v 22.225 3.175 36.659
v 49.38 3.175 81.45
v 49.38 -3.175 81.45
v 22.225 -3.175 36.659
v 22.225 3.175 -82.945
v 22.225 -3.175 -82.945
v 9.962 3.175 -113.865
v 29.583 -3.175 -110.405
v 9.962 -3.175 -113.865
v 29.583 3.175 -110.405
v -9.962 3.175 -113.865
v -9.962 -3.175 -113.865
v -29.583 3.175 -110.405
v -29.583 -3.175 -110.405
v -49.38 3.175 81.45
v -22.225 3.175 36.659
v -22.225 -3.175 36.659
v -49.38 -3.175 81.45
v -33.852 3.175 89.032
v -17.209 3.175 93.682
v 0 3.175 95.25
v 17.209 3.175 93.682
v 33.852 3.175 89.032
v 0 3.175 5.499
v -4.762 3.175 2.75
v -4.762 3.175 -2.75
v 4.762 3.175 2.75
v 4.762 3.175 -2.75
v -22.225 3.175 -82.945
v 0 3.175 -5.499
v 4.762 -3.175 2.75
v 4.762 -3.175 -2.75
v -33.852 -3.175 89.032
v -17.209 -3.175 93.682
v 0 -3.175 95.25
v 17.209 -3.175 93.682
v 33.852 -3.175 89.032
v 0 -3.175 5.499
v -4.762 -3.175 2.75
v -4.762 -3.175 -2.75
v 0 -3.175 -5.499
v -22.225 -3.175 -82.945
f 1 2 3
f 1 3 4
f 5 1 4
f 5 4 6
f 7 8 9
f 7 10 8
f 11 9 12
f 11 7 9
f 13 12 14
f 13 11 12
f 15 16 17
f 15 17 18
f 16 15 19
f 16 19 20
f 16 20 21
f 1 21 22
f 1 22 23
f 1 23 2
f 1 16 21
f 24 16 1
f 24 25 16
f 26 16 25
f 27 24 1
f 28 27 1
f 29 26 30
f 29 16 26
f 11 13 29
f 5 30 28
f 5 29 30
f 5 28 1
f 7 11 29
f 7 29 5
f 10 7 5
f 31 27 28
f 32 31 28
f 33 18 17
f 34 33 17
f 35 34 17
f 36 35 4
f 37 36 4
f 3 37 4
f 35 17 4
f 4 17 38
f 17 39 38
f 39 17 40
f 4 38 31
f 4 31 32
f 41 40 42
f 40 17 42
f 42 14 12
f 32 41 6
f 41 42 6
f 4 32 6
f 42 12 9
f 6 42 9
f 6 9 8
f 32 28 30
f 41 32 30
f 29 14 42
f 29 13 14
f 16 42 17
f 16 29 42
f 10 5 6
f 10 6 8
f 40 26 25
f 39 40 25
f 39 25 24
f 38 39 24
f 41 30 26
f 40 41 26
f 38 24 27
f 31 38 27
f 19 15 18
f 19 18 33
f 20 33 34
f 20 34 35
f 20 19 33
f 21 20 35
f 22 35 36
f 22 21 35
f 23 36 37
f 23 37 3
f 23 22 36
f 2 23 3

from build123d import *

# Parameters (mm, degrees)
BOSS_EXTRUDE1_DEPTH = 3.175
CUT_EXTRUDE1_REACH  = 126.672


with BuildPart() as part:
    # Sketch1 → Boss-Extrude1 (new, symmetric)
    with BuildSketch(Plane(origin=(0, 0, 0), x_dir=(1, 0, 0), z_dir=(0, 1, 0))):
        with BuildLine():
            Line((-22.225, 82.944829198), (-22.225, -36.659057496))
            Line((-22.225, -36.659057496), (-49.38024545, -81.450315281))
            ThreePointArc((-49.38024545, -81.450315281), (0, -95.25), (49.38024545, -81.450315281))
            Line((49.38024545, -81.450315281), (22.225, -36.659057496))
            Line((22.225, -36.659057496), (22.225, 82.944829198))
            Line((22.225, 82.944829198), (29.583016855, 110.405321945))
            ThreePointArc((29.583016855, 110.405321945), (0, 114.3), (-29.583016855, 110.405321945))
            Line((-29.583016855, 110.405321945), (-22.225, 82.944829198))
        make_face()
    extrude(amount=BOSS_EXTRUDE1_DEPTH, both=True)

    # Sketch2 → Cut-Extrude1 (cut, up to next)
    with BuildSketch(Plane(origin=(0, 3.175, 0), x_dir=(1, 0, 0), z_dir=(0, 1, 0)), mode=Mode.PRIVATE) as cut_extrude1_sk1:
        Polygon((4.7625, -2.749630657), (4.7625, 2.749630657), (0, 5.499261314), (-4.7625, 2.749630657), (-4.7625, -2.749630657), (0, -5.499261314), align=None)
    cut_extrude1_tool1 = extrude(cut_extrude1_sk1.sketch, amount=-CUT_EXTRUDE1_REACH, mode=Mode.PRIVATE) & part.part
    add(cut_extrude1_tool1.solids().sort_by_distance((0, 3.175, 0))[0], mode=Mode.SUBTRACT)


solid = part.part
